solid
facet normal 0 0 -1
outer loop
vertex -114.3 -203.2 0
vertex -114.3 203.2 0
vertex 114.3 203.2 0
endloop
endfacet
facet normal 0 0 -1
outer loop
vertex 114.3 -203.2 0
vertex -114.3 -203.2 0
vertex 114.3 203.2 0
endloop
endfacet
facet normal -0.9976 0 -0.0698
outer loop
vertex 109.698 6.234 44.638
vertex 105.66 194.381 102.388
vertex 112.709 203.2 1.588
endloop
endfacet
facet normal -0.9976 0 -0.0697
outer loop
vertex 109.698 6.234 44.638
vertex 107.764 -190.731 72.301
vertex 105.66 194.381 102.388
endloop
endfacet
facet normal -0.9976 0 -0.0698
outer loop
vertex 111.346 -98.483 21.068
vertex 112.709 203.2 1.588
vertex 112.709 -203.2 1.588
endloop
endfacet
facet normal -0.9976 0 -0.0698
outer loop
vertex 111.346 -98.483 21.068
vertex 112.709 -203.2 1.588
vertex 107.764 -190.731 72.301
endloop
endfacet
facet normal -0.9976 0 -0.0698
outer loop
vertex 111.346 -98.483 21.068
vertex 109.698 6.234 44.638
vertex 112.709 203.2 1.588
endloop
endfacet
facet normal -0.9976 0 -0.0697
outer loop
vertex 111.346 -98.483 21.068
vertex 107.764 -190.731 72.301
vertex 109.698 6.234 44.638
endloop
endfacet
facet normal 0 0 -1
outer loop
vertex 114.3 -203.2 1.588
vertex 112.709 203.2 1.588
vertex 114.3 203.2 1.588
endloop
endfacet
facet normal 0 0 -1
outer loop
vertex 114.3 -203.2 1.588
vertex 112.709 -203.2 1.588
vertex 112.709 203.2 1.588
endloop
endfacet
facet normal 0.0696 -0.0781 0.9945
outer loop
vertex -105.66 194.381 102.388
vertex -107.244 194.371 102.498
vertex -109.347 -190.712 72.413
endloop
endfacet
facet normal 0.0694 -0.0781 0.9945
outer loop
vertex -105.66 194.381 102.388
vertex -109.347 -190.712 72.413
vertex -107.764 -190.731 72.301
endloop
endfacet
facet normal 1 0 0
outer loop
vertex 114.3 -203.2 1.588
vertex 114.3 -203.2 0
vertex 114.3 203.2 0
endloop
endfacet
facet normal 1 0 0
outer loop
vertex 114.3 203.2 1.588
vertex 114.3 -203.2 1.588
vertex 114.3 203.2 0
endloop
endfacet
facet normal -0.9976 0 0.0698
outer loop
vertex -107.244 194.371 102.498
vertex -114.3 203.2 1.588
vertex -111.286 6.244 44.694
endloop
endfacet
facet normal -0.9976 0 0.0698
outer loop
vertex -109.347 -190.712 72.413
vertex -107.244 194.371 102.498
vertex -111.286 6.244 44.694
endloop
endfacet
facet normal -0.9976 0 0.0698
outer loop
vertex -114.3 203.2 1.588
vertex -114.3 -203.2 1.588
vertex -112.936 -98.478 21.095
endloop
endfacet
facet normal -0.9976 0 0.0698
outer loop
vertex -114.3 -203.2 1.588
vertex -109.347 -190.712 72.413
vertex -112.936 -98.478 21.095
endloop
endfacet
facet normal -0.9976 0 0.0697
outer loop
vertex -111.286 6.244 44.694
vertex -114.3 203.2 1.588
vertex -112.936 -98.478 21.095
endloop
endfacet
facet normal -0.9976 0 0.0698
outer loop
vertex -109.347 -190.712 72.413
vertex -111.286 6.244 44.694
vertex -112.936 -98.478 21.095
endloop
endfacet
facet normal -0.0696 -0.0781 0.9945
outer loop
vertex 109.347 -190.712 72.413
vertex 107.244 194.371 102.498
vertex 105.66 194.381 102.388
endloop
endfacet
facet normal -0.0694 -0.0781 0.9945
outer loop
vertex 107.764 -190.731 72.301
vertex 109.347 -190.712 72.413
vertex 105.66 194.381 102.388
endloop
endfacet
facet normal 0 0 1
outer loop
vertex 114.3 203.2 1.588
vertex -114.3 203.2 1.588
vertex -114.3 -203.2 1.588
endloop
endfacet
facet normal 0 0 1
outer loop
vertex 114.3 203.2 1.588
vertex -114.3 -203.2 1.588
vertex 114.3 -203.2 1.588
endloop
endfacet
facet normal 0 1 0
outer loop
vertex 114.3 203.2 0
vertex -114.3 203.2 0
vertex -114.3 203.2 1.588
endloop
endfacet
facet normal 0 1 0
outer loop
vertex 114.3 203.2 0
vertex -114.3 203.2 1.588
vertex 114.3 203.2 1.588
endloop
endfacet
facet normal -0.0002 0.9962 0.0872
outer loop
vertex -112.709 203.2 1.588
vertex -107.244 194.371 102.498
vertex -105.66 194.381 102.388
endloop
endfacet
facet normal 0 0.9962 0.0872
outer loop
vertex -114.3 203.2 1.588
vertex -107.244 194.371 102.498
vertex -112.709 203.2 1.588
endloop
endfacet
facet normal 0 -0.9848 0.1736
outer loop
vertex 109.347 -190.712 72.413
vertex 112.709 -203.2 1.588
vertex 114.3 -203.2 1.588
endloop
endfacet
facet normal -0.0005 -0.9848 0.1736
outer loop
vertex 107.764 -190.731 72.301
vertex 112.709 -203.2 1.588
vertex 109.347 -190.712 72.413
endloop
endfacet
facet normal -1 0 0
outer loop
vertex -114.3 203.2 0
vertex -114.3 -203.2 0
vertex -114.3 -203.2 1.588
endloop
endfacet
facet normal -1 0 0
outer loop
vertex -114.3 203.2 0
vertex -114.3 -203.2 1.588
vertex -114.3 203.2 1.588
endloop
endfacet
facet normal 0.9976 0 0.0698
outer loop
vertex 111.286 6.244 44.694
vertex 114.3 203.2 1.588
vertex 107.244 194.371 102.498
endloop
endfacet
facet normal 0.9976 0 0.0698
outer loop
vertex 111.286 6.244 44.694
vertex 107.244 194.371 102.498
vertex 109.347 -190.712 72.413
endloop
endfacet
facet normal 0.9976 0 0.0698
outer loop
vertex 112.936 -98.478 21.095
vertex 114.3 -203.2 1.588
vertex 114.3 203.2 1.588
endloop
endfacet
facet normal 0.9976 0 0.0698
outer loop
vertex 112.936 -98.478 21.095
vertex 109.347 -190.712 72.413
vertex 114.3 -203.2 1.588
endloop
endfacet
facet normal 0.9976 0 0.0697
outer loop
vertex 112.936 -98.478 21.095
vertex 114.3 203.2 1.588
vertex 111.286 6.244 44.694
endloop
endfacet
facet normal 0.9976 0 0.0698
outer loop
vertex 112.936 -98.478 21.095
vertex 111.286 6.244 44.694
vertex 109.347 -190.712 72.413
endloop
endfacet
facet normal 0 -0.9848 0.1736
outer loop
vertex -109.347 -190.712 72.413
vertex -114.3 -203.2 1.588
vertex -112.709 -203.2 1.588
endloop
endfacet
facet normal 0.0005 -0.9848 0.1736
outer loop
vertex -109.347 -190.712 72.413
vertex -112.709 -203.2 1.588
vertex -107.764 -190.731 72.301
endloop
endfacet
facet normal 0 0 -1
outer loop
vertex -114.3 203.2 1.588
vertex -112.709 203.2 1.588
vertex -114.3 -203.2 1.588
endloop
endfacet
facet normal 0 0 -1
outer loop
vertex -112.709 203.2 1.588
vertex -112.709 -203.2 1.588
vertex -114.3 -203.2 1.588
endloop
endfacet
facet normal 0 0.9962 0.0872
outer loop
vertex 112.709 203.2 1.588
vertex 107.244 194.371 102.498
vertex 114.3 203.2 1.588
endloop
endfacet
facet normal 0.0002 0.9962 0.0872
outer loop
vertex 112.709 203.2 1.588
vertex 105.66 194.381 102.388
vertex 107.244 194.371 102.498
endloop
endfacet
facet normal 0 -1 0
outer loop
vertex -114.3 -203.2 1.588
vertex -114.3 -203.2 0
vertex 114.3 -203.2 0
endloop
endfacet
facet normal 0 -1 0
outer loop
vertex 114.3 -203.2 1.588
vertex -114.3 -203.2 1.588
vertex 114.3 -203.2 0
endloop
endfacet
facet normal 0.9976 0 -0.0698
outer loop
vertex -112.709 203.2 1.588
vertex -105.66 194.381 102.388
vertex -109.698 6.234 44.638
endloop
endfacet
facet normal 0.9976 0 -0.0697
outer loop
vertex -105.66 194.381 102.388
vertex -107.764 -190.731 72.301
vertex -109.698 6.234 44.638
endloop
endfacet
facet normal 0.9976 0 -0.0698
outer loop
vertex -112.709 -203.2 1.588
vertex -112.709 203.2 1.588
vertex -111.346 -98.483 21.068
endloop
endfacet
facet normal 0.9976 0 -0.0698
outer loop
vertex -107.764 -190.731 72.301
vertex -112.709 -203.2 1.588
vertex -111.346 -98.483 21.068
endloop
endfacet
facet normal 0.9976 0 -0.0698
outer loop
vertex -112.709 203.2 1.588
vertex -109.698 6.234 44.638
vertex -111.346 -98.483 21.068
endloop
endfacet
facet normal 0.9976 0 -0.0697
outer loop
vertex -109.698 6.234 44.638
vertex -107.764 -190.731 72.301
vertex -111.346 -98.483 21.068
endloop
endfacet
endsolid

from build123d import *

# Parameters (mm, degrees)
F0_W          = 228.6
F0_H          = 406.4
F1_DEPTH      = 1.5875
F7_DEPTH      = 203.2
F7_DEPTH_BACK = 147.32


with BuildPart() as f1:
    # F0 (on Top) → F1 (new body)
    with BuildSketch(Plane.XY):
        Rectangle(F0_W, F0_H)
    extrude(amount=F1_DEPTH)


with BuildPart() as f4:
    # F2 (on face) → F4 section 0
    with BuildSketch(Plane(origin=(0, 203.2, 0), x_dir=(-1, 0, 0), z_dir=(0, 1, 0))):
        Polygon((112.7086234868, 1.5875), (114.3, 1.5875), (107.1954359065, 103.1875), (105.6118029768, 103.0767615979), align=None)
    # F3 (on face) → F4 section 1
    with BuildSketch(Plane.XZ.offset(203.2)):
        Polygon((-109.4156121857, 71.4375), (-114.3, 1.5875), (-112.7086234868, 1.5875), (-107.831979256, 71.3267615979), align=None)
    loft()


with BuildPart() as f6_1:
    # F6: instance of F4
    add(f4.part.mirror(Plane.YZ))


with BuildPart() as f7_tool:
    # F5 (on Right) → F7 (new body, two sides)
    with BuildSketch(Plane.YZ) as f7_sk:
        Polygon((192.9446142204, 118.8070958455), (203.2, 1.5875), (203.2, 118.8070958455), align=None)
        Polygon((-203.2, 88.56990411), (-203.2, 1.5875), (-187.8626553085, 88.56990411), align=None)
    extrude(amount=-F7_DEPTH)
    extrude(f7_sk.sketch, amount=F7_DEPTH_BACK)


with BuildPart() as f4_1:
    add(f4.part)

    # F7: cut by f7_tool
    add(f7_tool.part, mode=Mode.SUBTRACT)


with BuildPart() as f6_1_1:
    add(f6_1.part)

    # F7: cut by f7_tool
    add(f7_tool.part, mode=Mode.SUBTRACT)


solid = Compound([f1.part, f4_1.part, f6_1_1.part])
